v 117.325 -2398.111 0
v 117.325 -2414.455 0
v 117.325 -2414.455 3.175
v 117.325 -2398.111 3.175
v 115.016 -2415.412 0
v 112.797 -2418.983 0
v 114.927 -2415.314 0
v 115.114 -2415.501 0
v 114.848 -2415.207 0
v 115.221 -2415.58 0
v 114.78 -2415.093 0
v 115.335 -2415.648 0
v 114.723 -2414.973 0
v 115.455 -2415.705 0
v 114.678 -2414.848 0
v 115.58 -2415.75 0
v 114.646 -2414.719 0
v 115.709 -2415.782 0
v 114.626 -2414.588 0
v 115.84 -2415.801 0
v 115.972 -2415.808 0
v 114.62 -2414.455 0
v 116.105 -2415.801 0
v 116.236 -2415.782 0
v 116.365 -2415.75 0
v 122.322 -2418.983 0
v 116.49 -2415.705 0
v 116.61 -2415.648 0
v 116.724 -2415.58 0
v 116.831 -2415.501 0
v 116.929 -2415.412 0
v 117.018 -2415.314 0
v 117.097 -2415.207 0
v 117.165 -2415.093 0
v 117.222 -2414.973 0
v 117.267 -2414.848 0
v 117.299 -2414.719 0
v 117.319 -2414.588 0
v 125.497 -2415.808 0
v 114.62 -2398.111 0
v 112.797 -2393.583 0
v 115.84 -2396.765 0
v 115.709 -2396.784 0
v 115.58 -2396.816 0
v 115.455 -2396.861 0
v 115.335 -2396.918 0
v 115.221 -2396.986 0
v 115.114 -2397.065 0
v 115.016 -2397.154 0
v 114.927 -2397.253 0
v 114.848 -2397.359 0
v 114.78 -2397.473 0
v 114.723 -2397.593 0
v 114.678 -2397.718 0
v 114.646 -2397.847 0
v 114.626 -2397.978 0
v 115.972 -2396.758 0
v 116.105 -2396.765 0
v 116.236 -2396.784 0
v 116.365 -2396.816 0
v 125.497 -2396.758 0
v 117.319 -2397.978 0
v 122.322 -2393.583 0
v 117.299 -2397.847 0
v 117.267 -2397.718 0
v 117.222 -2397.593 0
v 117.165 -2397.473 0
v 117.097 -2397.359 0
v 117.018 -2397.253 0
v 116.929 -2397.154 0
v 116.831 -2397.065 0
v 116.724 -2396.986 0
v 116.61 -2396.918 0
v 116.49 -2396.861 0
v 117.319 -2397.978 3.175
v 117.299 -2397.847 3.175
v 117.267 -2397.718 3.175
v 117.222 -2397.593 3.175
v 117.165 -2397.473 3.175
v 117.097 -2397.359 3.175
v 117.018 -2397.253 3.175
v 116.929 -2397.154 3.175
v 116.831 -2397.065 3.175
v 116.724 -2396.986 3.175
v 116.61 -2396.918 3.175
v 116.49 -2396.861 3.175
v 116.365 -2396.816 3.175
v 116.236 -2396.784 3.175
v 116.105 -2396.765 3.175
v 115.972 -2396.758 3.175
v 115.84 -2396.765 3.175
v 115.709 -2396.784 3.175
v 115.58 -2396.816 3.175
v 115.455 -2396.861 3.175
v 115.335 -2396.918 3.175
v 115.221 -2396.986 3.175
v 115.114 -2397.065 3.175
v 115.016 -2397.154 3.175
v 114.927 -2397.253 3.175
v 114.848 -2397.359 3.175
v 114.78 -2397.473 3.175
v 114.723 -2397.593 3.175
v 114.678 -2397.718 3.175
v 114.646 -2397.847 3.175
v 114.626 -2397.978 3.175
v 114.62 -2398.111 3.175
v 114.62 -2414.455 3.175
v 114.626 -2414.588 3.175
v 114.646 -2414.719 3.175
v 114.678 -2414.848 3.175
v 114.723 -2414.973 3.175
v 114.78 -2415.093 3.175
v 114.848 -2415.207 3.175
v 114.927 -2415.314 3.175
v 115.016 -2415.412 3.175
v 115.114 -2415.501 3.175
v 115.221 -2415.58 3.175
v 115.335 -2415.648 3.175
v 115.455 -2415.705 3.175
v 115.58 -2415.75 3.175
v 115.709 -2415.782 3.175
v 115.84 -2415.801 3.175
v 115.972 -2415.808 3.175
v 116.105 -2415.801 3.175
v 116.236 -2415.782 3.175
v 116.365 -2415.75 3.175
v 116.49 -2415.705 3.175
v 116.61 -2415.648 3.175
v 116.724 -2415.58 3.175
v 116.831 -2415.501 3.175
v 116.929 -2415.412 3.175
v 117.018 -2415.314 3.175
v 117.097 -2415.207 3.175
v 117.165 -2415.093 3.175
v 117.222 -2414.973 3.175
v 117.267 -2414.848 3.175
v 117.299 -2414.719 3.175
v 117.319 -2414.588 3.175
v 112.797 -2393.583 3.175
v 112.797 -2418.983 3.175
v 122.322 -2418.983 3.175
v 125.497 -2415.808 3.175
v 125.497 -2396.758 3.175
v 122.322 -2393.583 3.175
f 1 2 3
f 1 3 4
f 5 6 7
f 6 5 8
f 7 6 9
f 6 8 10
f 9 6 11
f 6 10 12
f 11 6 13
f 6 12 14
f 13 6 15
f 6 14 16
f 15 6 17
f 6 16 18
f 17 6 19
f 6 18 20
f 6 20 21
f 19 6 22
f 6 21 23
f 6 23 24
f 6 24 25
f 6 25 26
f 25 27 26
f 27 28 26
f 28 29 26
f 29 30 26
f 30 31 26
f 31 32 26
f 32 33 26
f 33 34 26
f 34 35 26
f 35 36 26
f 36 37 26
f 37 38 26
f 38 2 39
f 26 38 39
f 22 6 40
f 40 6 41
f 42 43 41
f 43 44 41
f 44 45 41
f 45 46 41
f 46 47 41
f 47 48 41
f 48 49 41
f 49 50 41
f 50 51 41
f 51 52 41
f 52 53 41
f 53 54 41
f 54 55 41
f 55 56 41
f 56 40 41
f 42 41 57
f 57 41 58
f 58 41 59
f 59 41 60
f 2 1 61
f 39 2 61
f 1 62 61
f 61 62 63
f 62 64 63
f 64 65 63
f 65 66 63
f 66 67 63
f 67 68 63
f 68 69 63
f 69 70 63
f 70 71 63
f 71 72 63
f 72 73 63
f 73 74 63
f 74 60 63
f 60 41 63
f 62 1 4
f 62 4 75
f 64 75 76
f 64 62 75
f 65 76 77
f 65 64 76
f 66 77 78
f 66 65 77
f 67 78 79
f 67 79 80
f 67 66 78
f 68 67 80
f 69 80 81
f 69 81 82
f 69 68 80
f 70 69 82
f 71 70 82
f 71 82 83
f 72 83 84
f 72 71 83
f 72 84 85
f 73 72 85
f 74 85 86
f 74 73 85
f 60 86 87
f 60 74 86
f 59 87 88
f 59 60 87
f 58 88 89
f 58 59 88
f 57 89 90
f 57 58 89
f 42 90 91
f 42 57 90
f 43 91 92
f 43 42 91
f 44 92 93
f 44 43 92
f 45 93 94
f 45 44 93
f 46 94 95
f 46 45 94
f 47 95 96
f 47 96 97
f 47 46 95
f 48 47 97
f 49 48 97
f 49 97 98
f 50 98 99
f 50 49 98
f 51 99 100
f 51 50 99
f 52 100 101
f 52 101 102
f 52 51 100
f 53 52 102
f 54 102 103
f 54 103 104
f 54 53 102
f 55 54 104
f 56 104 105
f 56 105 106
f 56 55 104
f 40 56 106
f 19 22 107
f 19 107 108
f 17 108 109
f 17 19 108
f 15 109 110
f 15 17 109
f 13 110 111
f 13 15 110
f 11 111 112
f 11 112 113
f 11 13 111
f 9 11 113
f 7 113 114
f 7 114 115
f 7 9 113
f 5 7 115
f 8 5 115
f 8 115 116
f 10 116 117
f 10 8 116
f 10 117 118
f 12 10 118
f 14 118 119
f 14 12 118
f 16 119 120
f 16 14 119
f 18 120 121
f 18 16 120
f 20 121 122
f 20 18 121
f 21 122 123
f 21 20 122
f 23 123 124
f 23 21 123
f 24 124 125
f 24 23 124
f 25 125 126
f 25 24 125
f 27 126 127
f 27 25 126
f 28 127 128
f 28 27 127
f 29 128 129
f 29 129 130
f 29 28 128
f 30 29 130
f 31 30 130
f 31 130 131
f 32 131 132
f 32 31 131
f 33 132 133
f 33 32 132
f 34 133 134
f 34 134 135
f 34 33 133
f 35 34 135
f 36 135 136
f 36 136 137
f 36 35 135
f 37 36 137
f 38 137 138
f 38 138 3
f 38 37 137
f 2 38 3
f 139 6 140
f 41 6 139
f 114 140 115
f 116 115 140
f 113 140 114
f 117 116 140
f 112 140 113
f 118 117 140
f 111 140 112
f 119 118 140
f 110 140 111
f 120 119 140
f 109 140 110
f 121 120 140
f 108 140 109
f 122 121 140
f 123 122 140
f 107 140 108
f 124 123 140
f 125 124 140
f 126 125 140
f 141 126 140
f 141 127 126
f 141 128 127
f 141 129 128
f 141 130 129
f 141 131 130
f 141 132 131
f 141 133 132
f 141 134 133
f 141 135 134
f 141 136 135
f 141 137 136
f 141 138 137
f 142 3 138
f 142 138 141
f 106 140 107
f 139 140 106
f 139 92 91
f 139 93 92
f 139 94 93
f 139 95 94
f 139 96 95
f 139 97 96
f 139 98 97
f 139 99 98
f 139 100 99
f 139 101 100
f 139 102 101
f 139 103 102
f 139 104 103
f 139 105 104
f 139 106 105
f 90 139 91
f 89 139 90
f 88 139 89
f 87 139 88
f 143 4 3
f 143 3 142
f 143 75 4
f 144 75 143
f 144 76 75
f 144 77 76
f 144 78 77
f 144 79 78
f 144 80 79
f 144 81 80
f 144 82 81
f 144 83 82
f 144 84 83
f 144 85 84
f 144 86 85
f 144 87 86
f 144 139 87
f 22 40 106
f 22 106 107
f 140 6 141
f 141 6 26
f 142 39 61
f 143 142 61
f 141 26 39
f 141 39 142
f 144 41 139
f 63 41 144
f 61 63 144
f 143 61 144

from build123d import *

# Parameters (mm, degrees)
SKETCH1_W                 = 12.7
SKETCH1_H                 = 25.4
BOSS_EXTRUDE1_DEPTH       = 3.175
CHAMFER1_SIZE             = 3.175
F_2_CLEARANCE_SLOT1_DEPTH = 3.175


# Read off the part's stored shape, not the designer's step: #2 Clearance Slot1
with BuildPart() as part:
    # Sketch1 → Boss-Extrude1 (new body)
    with BuildSketch(Plane.XY):
        with Locations((119.14748118, -2406.283004154)):
            Rectangle(SKETCH1_W, SKETCH1_H)
    extrude(amount=BOSS_EXTRUDE1_DEPTH)

    # Chamfer1
    chamfer1_edges = [part.edges().sort_by_distance(p)[0] for p in [
        (125.49748118, -2393.583004154, 1.5875),
        (125.49748118, -2418.983004154, 1.5875),
    ]]
    chamfer(chamfer1_edges, length=CHAMFER1_SIZE)

    # #2 Clearance Slot1 outline → #2 Clearance Slot1 (cut)
    with BuildSketch(Plane.XY):
        with BuildLine():
            Line((117.32503118, -2414.455454154), (117.32503118, -2398.110554154))
            ThreePointArc((117.32503118, -2398.110554154), (115.97248118, -2396.758004154), (114.61993118, -2398.110554154))
            Line((114.61993118, -2398.110554154), (114.61993118, -2414.455454154))
            ThreePointArc((114.61993118, -2414.455454154), (115.97248118, -2415.808004154), (117.32503118, -2414.455454154))
        make_face()
    extrude(amount=F_2_CLEARANCE_SLOT1_DEPTH, mode=Mode.SUBTRACT)


solid = part.part
